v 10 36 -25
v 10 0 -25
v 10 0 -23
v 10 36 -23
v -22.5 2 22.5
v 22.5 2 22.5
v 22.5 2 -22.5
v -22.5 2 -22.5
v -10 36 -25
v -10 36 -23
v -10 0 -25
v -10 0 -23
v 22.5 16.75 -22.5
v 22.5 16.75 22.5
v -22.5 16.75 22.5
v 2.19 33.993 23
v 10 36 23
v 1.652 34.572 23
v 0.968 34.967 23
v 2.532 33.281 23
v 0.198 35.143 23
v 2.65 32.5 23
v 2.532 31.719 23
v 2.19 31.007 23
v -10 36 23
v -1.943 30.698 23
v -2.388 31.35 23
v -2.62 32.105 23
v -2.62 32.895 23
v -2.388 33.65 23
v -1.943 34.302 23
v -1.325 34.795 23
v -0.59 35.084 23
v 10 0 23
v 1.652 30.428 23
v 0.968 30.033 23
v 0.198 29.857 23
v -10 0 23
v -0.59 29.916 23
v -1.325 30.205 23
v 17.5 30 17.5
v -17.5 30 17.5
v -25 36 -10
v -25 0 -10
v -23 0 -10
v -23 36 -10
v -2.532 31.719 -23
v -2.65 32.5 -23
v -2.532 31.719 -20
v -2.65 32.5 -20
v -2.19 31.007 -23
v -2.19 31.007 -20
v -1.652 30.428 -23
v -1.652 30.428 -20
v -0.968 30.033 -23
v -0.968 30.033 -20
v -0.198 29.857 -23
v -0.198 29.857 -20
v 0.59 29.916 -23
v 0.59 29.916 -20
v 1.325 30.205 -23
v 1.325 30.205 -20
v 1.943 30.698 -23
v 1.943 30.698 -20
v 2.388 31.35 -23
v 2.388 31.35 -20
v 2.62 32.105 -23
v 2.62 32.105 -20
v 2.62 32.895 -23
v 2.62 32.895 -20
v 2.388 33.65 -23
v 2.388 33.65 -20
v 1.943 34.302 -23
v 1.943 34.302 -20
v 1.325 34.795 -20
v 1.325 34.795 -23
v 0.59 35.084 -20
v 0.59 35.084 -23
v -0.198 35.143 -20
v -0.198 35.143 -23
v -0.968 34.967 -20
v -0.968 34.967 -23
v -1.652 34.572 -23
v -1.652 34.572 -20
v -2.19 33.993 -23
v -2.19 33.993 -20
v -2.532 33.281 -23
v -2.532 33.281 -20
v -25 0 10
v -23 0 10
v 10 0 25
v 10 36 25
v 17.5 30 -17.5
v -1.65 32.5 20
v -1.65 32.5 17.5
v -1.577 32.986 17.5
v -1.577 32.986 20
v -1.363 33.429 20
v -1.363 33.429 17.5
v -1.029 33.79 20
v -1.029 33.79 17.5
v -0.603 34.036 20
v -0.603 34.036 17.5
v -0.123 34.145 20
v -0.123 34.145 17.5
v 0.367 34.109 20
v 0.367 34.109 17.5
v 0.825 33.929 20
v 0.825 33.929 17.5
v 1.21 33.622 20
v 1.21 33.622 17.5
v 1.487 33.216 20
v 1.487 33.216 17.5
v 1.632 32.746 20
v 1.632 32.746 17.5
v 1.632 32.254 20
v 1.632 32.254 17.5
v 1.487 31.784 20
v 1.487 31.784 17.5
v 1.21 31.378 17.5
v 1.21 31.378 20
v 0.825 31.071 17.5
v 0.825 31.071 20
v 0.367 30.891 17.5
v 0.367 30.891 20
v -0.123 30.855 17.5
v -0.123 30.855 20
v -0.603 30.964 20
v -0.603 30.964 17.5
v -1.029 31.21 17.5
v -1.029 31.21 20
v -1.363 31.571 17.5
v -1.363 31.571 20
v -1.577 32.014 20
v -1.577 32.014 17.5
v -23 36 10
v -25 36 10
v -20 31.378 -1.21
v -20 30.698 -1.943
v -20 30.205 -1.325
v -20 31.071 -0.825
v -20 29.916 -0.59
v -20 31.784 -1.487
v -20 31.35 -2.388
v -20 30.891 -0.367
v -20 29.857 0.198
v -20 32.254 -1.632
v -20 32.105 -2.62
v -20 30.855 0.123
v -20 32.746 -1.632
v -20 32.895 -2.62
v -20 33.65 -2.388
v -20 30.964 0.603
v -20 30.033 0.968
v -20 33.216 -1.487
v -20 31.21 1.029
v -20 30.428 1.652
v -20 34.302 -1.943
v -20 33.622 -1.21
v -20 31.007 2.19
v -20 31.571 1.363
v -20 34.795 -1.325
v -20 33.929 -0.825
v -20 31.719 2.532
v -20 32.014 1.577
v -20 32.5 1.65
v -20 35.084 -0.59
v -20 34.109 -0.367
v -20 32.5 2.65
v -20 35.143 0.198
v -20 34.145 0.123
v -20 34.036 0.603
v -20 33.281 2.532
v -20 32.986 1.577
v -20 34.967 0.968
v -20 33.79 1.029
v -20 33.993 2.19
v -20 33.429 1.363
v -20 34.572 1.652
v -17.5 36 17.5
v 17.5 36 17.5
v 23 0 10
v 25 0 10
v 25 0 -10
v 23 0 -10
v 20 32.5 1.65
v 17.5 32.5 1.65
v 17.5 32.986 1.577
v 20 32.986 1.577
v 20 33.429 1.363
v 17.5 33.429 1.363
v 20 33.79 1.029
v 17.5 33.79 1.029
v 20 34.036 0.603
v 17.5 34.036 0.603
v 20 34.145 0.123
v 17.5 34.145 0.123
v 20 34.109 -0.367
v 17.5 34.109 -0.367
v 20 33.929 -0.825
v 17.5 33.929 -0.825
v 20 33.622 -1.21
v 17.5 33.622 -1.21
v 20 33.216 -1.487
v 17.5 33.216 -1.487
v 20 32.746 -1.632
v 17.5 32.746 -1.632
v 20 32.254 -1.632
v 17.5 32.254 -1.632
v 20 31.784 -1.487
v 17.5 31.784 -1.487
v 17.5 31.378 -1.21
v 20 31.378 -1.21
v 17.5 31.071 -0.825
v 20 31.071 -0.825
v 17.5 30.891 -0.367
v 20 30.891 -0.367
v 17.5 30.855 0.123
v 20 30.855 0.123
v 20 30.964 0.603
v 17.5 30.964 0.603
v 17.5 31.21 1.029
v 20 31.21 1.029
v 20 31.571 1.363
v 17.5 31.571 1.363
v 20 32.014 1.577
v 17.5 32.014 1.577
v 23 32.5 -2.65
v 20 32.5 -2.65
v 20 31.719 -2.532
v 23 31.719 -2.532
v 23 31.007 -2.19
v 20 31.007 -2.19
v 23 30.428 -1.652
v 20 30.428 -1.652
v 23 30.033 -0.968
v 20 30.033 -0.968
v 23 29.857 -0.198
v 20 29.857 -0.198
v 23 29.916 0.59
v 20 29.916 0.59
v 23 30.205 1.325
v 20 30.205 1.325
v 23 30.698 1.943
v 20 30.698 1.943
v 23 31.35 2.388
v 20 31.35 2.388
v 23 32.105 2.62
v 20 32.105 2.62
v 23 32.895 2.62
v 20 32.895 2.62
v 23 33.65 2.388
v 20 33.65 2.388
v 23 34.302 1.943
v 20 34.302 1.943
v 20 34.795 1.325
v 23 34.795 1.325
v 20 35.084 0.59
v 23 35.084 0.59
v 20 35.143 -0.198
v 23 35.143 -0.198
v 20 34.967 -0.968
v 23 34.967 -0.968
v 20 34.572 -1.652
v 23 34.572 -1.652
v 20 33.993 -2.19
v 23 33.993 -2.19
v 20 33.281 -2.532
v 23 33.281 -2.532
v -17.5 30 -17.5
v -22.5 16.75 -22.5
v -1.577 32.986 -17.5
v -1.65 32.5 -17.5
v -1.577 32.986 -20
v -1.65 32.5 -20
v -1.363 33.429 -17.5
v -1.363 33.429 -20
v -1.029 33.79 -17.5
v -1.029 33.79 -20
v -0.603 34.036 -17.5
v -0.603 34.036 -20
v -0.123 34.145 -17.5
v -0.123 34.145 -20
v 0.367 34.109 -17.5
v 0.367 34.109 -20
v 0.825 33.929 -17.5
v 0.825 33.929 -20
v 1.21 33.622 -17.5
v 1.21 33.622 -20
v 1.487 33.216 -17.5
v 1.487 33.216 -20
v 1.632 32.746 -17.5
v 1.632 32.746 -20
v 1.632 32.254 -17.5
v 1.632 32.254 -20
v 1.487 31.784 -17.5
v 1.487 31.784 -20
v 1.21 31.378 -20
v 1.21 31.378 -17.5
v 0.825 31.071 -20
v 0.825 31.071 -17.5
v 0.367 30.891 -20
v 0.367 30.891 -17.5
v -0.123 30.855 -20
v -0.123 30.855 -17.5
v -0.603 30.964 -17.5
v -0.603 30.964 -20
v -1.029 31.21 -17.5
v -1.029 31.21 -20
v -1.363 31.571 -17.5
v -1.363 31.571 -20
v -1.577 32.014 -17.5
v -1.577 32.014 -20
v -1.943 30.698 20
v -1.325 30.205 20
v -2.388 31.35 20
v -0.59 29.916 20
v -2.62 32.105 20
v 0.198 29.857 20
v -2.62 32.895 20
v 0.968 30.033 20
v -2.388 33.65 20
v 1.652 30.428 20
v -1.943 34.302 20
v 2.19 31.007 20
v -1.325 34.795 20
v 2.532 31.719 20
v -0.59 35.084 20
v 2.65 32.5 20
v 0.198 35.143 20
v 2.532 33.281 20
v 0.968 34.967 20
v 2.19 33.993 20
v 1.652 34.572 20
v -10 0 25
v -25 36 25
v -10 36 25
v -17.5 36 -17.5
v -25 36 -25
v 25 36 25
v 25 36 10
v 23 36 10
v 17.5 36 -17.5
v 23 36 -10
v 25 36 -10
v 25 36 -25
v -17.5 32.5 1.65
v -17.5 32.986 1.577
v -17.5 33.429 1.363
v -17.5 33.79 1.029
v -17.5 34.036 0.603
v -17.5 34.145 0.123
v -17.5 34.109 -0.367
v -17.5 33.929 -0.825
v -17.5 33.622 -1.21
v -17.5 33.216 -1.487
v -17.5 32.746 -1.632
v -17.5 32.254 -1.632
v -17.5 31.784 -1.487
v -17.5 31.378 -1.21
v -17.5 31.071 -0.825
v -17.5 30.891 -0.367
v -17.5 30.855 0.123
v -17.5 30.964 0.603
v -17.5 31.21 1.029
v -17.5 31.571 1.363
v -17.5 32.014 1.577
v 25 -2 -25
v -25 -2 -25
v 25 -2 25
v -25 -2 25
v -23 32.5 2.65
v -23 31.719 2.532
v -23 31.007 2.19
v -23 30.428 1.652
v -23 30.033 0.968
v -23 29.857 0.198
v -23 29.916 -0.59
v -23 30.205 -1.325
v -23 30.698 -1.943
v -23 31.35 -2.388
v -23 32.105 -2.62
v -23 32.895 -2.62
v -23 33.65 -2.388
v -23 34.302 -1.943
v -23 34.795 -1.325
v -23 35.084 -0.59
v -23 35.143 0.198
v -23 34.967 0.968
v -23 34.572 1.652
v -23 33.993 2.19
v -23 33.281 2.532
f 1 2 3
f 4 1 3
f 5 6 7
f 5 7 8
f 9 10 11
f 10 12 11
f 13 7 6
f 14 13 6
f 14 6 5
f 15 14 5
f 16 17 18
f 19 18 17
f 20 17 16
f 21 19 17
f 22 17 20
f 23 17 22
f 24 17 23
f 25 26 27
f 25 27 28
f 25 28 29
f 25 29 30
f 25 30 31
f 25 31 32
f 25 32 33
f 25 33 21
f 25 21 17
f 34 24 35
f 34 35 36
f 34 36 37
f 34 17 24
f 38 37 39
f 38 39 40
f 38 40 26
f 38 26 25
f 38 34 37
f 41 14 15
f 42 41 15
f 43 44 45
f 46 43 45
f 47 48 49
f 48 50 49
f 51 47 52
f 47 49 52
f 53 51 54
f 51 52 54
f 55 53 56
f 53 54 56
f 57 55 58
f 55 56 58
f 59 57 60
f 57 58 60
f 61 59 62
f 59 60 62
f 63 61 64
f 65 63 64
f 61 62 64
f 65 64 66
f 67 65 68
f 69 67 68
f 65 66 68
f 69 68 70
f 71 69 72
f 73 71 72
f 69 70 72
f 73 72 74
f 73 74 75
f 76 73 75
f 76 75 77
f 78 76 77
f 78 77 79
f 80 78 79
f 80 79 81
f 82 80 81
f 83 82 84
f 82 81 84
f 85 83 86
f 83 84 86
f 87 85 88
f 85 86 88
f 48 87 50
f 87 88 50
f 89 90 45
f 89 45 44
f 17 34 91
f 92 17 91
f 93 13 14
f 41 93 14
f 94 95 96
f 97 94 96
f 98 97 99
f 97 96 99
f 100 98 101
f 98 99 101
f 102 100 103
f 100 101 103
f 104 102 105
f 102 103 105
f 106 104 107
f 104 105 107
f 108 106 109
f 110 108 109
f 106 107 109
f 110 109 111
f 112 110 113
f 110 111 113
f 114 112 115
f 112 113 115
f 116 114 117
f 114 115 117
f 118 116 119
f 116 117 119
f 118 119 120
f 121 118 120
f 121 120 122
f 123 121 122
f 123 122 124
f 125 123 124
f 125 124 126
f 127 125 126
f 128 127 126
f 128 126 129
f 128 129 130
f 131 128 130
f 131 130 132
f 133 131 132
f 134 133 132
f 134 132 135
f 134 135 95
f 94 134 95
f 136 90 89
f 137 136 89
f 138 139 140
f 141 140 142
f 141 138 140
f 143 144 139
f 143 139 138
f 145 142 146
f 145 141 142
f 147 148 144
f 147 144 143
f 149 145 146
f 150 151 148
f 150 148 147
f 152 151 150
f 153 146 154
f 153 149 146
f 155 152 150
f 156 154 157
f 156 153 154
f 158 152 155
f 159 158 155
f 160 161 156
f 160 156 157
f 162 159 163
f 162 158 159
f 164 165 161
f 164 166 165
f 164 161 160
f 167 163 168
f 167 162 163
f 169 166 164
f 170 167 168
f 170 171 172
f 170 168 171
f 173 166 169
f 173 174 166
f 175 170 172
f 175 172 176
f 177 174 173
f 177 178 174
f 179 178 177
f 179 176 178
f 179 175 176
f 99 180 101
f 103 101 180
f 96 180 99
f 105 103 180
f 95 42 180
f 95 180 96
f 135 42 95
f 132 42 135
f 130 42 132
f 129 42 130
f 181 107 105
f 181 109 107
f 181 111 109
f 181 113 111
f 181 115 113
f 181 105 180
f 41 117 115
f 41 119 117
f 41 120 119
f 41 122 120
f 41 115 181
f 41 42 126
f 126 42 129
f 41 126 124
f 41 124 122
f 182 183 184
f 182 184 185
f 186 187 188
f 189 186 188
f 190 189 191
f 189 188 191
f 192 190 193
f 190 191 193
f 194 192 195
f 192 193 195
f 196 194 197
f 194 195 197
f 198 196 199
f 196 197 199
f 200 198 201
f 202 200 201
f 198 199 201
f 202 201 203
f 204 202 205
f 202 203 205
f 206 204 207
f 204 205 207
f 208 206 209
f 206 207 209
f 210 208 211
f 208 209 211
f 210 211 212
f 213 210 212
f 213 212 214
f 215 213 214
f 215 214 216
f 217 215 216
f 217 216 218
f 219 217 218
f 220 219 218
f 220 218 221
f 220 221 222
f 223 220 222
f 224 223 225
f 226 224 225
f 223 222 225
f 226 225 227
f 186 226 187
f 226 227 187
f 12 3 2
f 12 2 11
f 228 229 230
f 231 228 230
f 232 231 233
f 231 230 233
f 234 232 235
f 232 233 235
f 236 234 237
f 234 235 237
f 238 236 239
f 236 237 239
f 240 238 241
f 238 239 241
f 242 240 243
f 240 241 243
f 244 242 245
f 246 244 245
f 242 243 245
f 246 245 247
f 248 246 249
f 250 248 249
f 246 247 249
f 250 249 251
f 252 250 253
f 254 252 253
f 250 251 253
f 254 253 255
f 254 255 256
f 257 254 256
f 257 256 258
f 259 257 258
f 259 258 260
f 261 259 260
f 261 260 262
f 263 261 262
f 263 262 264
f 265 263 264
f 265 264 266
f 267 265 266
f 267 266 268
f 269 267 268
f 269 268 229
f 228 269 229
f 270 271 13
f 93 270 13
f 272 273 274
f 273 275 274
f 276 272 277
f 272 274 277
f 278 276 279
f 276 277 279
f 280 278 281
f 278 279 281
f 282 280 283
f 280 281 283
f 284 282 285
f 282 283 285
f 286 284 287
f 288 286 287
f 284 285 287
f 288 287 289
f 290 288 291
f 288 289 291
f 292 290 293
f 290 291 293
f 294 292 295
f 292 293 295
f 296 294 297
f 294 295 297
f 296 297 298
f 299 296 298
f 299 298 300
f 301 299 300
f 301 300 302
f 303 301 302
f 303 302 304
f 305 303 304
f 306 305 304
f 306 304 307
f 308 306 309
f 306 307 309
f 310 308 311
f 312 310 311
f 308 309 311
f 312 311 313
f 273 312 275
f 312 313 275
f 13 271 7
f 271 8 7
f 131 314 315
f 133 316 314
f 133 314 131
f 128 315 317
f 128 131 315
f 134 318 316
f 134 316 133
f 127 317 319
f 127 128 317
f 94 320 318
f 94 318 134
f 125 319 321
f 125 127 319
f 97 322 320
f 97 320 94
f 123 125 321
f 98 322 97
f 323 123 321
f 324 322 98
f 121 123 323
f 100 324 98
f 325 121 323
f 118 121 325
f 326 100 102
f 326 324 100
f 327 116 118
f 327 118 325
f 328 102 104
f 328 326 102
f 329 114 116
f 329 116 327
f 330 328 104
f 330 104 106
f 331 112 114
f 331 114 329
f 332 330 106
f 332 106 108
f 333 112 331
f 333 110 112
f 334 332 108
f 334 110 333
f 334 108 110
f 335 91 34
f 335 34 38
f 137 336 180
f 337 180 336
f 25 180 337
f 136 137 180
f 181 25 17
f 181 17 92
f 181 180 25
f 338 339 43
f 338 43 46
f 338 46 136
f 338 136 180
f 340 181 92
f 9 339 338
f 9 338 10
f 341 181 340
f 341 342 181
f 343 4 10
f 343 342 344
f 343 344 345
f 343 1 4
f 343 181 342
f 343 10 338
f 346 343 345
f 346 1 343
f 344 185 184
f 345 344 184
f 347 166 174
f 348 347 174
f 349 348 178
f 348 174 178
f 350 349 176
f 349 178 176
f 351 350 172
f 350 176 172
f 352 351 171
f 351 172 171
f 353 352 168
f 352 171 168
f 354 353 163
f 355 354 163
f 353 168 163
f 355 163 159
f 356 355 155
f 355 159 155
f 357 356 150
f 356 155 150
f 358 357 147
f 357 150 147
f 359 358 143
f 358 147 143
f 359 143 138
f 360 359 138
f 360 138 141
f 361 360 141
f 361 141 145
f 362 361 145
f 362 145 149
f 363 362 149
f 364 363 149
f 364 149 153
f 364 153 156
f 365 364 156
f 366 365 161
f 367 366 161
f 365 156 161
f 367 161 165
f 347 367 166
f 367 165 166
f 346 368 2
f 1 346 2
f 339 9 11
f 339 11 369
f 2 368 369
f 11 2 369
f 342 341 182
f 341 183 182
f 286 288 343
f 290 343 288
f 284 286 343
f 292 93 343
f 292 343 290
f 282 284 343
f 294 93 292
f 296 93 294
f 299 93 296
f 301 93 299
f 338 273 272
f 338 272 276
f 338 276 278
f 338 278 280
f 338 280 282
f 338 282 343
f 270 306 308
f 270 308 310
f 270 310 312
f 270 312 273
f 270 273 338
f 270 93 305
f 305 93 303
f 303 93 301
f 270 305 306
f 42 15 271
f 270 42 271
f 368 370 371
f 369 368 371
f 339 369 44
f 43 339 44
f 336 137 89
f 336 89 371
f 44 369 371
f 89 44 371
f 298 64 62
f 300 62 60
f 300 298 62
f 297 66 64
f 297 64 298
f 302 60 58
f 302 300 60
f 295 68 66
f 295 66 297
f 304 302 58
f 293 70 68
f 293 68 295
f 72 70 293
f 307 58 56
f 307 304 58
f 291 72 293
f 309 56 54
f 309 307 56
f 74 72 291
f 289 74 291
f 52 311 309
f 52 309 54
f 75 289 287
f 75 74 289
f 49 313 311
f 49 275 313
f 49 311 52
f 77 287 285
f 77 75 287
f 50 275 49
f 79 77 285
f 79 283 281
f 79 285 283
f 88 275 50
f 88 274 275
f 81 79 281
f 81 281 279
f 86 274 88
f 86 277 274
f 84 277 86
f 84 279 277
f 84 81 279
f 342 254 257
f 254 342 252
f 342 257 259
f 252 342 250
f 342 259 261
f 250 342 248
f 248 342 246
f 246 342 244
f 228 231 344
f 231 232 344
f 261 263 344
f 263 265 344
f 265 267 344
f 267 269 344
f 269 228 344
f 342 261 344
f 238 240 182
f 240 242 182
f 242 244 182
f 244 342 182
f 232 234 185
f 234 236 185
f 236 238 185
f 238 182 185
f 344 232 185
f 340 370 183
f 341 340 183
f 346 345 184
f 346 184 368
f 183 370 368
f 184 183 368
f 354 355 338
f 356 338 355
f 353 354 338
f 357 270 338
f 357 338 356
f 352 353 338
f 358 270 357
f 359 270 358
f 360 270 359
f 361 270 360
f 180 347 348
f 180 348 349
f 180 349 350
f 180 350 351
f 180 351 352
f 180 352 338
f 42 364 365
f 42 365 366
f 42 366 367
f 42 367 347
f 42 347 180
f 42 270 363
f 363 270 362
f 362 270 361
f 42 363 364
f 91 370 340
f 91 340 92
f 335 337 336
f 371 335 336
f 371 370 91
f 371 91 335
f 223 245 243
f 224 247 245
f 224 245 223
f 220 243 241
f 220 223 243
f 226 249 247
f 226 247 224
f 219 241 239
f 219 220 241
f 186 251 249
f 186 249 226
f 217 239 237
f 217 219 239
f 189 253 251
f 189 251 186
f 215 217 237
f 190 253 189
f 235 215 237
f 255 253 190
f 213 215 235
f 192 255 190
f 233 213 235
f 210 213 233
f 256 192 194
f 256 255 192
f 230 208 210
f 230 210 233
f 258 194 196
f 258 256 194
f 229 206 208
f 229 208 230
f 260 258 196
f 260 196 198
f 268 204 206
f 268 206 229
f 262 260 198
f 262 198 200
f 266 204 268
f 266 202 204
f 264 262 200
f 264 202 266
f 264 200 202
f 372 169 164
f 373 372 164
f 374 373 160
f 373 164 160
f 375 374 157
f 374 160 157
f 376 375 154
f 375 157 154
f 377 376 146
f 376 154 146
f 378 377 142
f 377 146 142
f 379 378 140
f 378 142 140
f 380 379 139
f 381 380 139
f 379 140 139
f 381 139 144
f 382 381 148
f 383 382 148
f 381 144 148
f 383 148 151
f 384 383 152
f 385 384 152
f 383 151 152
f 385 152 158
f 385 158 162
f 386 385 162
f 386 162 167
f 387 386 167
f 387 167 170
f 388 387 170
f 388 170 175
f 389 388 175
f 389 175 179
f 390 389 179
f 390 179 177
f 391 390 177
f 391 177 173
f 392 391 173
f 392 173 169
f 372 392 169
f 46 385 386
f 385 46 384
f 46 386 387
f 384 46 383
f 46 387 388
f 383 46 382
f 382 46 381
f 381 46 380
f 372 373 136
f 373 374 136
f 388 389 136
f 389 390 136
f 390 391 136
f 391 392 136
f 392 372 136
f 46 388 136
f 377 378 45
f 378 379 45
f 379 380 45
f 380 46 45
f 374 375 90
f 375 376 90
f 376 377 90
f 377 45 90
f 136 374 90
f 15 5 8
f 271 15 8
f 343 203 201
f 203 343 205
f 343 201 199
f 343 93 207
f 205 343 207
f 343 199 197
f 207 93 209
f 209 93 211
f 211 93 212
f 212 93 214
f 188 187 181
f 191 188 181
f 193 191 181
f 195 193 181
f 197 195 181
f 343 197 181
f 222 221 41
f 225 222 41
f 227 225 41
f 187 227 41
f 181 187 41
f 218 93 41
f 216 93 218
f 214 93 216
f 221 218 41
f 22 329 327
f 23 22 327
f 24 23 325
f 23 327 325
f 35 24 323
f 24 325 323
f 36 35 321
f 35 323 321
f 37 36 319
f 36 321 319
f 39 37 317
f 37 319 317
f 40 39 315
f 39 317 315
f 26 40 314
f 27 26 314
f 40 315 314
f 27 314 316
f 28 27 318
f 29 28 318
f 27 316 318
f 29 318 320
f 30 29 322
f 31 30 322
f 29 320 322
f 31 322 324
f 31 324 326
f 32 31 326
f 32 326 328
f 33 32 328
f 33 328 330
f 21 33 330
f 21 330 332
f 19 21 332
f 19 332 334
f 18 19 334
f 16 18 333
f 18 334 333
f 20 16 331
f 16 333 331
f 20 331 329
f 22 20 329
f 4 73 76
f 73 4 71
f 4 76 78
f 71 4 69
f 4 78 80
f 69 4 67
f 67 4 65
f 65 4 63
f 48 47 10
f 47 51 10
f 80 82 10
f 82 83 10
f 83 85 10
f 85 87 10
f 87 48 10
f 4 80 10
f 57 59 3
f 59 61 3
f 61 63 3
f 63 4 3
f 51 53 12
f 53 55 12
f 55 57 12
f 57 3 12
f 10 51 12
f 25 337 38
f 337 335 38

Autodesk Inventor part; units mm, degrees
ref_plane "YZ Plane" through (0, 0, 0) normal (1, 0, 0) x (0, 1, 0)
ref_plane "XZ Plane" through (0, 0, 0) normal (0, 1, 0) x (-1, 0, 0)
sketch "Sketch1" plane through (0, 0, 0) normal (0, 1, 0) x (-1, 0, 0)
  line L0 (25, 25) -> (-25, 25)
  line L1 (-25, 25) -> (-25, -25)
  line L2 (-25, -25) -> (25, -25)
  line L3 (25, -25) -> (25, 25)
  line L4 (25, 25) -> (-25, -25) construction
  line L5 (-25, 25) -> (25, -25) construction
  line L6 (-22.5, 22.5) -> (22.5, 22.5)
  line L7 (22.5, 22.5) -> (22.5, -22.5)
  line L8 (22.5, -22.5) -> (-22.5, -22.5)
  line L9 (-22.5, -22.5) -> (-22.5, 22.5)
  line L10 (-22.5, 22.5) -> (22.5, -22.5) construction
  line L11 (22.5, 22.5) -> (-22.5, -22.5) construction
  point P0 (0, 0)
  dimension "d0" = 50
  dimension "d1" = 50
  dimension "d2" = 45
  dimension "d3" = 45
extrude "Extrusion1" add sketch "Sketch1" along normal blind 30
extrude "Extrusion2" add sketch "Sketch1" along normal blind 2 contours L6 L7 L8 L9
sketch "Sketch2" plane through (0, 30, 0) normal (0, 1, 0) x (1, 0, 0)
  point P0 (0, 0)
sketch "Sketch3" plane through (0, 30, 0) normal (0, 1, 0) x (1, 0, 0)
  line L0 (17.5, -17.5) -> (-17.5, -17.5)
  line L1 (-17.5, -17.5) -> (-17.5, 17.5)
  line L2 (-17.5, 17.5) -> (17.5, 17.5)
  line L3 (17.5, 17.5) -> (17.5, -17.5)
  line L4 (17.5, -17.5) -> (-17.5, 17.5) construction
  line L5 (-17.5, -17.5) -> (17.5, 17.5) construction
  line L6 (-25, 25) -> (-25, -25) projected
  line L7 (25, -25) -> (-25, -25)
  line L8 (-25, -25) -> (-25, 25)
  line L9 (-25, 25) -> (25, 25)
  line L10 (25, 25) -> (25, -25)
  line L11 (25, -25) -> (-25, 25) construction
  line L12 (-25, -25) -> (25, 25) construction
  point P0 (0, 0)
  dimension "d8" = 35
  dimension "d9" = 35
extrude "Extrusion3" add sketch "Sketch3" along normal blind 5.5
ref_plane "Work Plane1" through (0, 17.75, 0) normal (0, 1, 0) x (1, 0, 0)
chamfer "Chamfer1" distance 5 distance2 13.25 4 edges at (22.5, 30, 0) (0, 30, -22.5) (-22.5, 30, 0) (0, 30, 22.5) measured on face at (-5.8333, 30, 20.8333)
sketch "Sketch5" plane through (0, 35.5, 0) normal (0, 1, 0) x (1, 0, 0)
  point P0 (0, 0)
sketch "Sketch6" plane through (-17.5, 35.5, -17.5) normal (0, 0, 1) x (1, 0, 0)
  circle A0 centre (17.5, -3) radius 1.5
  line L0 (0, 0) -> (35, 0) projected
  point P0 (17.5, -35.5)
  point P1 (17.5, 0)
  dimension "d21" = 3
  dimension "d30" = 3
extrude "Extrusion5" cut sketch "Sketch6" against normal through all
sketch "Sketch7" plane through (0, 35.5, 0) normal (0, 1, 0) x (1, 0, 0)
  line L0 (25, 25) -> (-25, 25) projected
  line L1 (10, 25) -> (0, 25)
  line L2 (10, 25) -> (-10, 25)
  line L3 (-10, 25) -> (10, 25)
  line L4 (10, 25) -> (10, 23)
  line L5 (10, 23) -> (-10, 23)
  line L6 (-10, 23) -> (-10, 25)
  point P0 (0, 0)
  dimension "d24" = 20
  dimension "d25" = 2
extrude "Extrusion6" cut sketch "Sketch7" against normal through all
sketch "Sketch9" plane through (10, 35.5, -23) normal (0, 0, -1) x (-1, 0, 0)
  circle A0 centre (10, -3) radius 1.5 projected
  circle A1 centre (10, -3) radius 2.5
  point P0 (10, -35.5)
  dimension "d37" = 3
extrude "Extrusion7" cut sketch "Sketch9" against normal blind 3
pattern_circular "Circular Pattern2" count 4 over 360 about axis through (0, -10, 0) along (0, 1, 0) of "Extrusion7", "Extrusion6", "Extrusion5"
sketch "Sketch11" plane through (0, 32.5, -20) normal (0, 0, -1) x (-1, 0, 0)
  circle A0 centre (0, 0) radius 1.65
  circle A1 centre (0, 0) radius 2.65
  point P0 (0, -32.5)
  dimension "d38" = 3.3
  dimension "d39" = 5.3
extrude "Extrusion9" cut sketch "Sketch11" against normal through all contours A0
extrude "Extrusion10" cut sketch "Sketch11" along normal blind 4
sketch "Sketch12" plane through (0, 32.5, 20) normal (0, 0, 1) x (1, 0, 0)
  circle A0 centre (0, 0) radius 2.65
  point P0 (0, -32.5)
  dimension "d44" = 5.3
extrude "Extrusion11" cut sketch "Sketch12" along normal blind 9
sketch "Sketch13" plane through (-20, 32.5, 0) normal (-1, 0, 0) x (0, 0, 1)
  circle A0 centre (0, 0) radius 1.65
  circle A1 centre (0, 0) radius 2.65
  point P0 (0, -32.5)
  dimension "d47" = 3.3
  dimension "d48" = 5.3
extrude "Extrusion12" cut sketch "Sketch13" against normal through all contours A0
extrude "Extrusion13" cut sketch "Sketch13" along normal blind 9 contours A0 | A1
sketch "Sketch14" plane through (20, 32.5, 0) normal (1, 0, 0) x (0, 0, -1)
  circle A0 centre (0, 0) radius 2.65
  point P0 (0, -32.5)
  dimension "d53" = 5.3
extrude "Extrusion14" cut sketch "Sketch14" along normal blind 8.5
sketch "Sketch15" plane through (0, 35.5, 0) normal (0, 1, 0) x (1, 0, 0)
  line L0 (17.5, 17.5) -> (17.5, -17.5) projected
  line L1 (17.5, -17.5) -> (17.5, 17.5)
  line L2 (17.5, 17.5) -> (-17.5, 17.5)
  line L3 (-17.5, 17.5) -> (-17.5, -17.5)
  line L4 (-17.5, -17.5) -> (17.5, -17.5)
  line L5 (10, -23) -> (-10, -23) projected
  line L6 (10, -23) -> (10, -25)
  line L7 (10, -25) -> (25, -25)
  line L8 (25, -25) -> (25, -10)
  line L9 (23, -10) -> (23, 10) projected
  line L10 (25, -10) -> (23, -10)
  line L11 (23, -10) -> (23, 10)
  line L12 (23, 10) -> (25, 10)
  line L13 (25, 25) -> (10, 25) projected
  line L14 (25, 10) -> (25, 25)
  line L15 (25, 25) -> (10, 25)
  line L16 (10, 23) -> (-10, 23) projected
  line L17 (10, 25) -> (10, 23)
  line L18 (10, 23) -> (-10, 23)
  line L19 (-10, 23) -> (-10, 25)
  line L20 (-10, 25) -> (-25, 25) projected
  line L21 (-10, 25) -> (-25, 25)
  line L22 (-25, 25) -> (-25, 10)
  line L23 (-23, 10) -> (-23, -10) projected
  line L24 (-25, 10) -> (-23, 10)
  line L25 (-23, 10) -> (-23, -10)
  line L26 (-23, -10) -> (-25, -10)
  line L27 (-25, -10) -> (-25, -25)
  line L28 (-10, -23) -> (10, -23)
  line L29 (-10, -25) -> (-10, -23) projected
  line L30 (-10, -23) -> (-10, -25)
  line L31 (-10, -25) -> (-25, -25)
  point P0 (0, 0)
  dimension "d56" = 15
  dimension "d57" = 15
extrude "Extrusion15" add sketch "Sketch15" along normal blind 0.5
extrude "Extrusion16" add sketch "Sketch1" against normal blind 2 contours L3 L2 L1 L0 | L6 L7 L8 L9
sketch "Sketch16" plane through (0, -2, 0) normal (0, -1, 0) x (1, 0, 0)
  line L0 (-15.5086, 20.4473) -> (19.4914, 20.4473) construction
  line L1 (19.4914, 20.4473) -> (19.4914, -17.6327) construction
  line L2 (19.4914, -17.6327) -> (-15.5086, -17.6327) construction
  line L3 (-15.5086, -17.6327) -> (-15.5086, 20.4473) construction
  point P0 (0, 0)
  dimension "d73" = 35
properties part number "Ulepszona wersja"
